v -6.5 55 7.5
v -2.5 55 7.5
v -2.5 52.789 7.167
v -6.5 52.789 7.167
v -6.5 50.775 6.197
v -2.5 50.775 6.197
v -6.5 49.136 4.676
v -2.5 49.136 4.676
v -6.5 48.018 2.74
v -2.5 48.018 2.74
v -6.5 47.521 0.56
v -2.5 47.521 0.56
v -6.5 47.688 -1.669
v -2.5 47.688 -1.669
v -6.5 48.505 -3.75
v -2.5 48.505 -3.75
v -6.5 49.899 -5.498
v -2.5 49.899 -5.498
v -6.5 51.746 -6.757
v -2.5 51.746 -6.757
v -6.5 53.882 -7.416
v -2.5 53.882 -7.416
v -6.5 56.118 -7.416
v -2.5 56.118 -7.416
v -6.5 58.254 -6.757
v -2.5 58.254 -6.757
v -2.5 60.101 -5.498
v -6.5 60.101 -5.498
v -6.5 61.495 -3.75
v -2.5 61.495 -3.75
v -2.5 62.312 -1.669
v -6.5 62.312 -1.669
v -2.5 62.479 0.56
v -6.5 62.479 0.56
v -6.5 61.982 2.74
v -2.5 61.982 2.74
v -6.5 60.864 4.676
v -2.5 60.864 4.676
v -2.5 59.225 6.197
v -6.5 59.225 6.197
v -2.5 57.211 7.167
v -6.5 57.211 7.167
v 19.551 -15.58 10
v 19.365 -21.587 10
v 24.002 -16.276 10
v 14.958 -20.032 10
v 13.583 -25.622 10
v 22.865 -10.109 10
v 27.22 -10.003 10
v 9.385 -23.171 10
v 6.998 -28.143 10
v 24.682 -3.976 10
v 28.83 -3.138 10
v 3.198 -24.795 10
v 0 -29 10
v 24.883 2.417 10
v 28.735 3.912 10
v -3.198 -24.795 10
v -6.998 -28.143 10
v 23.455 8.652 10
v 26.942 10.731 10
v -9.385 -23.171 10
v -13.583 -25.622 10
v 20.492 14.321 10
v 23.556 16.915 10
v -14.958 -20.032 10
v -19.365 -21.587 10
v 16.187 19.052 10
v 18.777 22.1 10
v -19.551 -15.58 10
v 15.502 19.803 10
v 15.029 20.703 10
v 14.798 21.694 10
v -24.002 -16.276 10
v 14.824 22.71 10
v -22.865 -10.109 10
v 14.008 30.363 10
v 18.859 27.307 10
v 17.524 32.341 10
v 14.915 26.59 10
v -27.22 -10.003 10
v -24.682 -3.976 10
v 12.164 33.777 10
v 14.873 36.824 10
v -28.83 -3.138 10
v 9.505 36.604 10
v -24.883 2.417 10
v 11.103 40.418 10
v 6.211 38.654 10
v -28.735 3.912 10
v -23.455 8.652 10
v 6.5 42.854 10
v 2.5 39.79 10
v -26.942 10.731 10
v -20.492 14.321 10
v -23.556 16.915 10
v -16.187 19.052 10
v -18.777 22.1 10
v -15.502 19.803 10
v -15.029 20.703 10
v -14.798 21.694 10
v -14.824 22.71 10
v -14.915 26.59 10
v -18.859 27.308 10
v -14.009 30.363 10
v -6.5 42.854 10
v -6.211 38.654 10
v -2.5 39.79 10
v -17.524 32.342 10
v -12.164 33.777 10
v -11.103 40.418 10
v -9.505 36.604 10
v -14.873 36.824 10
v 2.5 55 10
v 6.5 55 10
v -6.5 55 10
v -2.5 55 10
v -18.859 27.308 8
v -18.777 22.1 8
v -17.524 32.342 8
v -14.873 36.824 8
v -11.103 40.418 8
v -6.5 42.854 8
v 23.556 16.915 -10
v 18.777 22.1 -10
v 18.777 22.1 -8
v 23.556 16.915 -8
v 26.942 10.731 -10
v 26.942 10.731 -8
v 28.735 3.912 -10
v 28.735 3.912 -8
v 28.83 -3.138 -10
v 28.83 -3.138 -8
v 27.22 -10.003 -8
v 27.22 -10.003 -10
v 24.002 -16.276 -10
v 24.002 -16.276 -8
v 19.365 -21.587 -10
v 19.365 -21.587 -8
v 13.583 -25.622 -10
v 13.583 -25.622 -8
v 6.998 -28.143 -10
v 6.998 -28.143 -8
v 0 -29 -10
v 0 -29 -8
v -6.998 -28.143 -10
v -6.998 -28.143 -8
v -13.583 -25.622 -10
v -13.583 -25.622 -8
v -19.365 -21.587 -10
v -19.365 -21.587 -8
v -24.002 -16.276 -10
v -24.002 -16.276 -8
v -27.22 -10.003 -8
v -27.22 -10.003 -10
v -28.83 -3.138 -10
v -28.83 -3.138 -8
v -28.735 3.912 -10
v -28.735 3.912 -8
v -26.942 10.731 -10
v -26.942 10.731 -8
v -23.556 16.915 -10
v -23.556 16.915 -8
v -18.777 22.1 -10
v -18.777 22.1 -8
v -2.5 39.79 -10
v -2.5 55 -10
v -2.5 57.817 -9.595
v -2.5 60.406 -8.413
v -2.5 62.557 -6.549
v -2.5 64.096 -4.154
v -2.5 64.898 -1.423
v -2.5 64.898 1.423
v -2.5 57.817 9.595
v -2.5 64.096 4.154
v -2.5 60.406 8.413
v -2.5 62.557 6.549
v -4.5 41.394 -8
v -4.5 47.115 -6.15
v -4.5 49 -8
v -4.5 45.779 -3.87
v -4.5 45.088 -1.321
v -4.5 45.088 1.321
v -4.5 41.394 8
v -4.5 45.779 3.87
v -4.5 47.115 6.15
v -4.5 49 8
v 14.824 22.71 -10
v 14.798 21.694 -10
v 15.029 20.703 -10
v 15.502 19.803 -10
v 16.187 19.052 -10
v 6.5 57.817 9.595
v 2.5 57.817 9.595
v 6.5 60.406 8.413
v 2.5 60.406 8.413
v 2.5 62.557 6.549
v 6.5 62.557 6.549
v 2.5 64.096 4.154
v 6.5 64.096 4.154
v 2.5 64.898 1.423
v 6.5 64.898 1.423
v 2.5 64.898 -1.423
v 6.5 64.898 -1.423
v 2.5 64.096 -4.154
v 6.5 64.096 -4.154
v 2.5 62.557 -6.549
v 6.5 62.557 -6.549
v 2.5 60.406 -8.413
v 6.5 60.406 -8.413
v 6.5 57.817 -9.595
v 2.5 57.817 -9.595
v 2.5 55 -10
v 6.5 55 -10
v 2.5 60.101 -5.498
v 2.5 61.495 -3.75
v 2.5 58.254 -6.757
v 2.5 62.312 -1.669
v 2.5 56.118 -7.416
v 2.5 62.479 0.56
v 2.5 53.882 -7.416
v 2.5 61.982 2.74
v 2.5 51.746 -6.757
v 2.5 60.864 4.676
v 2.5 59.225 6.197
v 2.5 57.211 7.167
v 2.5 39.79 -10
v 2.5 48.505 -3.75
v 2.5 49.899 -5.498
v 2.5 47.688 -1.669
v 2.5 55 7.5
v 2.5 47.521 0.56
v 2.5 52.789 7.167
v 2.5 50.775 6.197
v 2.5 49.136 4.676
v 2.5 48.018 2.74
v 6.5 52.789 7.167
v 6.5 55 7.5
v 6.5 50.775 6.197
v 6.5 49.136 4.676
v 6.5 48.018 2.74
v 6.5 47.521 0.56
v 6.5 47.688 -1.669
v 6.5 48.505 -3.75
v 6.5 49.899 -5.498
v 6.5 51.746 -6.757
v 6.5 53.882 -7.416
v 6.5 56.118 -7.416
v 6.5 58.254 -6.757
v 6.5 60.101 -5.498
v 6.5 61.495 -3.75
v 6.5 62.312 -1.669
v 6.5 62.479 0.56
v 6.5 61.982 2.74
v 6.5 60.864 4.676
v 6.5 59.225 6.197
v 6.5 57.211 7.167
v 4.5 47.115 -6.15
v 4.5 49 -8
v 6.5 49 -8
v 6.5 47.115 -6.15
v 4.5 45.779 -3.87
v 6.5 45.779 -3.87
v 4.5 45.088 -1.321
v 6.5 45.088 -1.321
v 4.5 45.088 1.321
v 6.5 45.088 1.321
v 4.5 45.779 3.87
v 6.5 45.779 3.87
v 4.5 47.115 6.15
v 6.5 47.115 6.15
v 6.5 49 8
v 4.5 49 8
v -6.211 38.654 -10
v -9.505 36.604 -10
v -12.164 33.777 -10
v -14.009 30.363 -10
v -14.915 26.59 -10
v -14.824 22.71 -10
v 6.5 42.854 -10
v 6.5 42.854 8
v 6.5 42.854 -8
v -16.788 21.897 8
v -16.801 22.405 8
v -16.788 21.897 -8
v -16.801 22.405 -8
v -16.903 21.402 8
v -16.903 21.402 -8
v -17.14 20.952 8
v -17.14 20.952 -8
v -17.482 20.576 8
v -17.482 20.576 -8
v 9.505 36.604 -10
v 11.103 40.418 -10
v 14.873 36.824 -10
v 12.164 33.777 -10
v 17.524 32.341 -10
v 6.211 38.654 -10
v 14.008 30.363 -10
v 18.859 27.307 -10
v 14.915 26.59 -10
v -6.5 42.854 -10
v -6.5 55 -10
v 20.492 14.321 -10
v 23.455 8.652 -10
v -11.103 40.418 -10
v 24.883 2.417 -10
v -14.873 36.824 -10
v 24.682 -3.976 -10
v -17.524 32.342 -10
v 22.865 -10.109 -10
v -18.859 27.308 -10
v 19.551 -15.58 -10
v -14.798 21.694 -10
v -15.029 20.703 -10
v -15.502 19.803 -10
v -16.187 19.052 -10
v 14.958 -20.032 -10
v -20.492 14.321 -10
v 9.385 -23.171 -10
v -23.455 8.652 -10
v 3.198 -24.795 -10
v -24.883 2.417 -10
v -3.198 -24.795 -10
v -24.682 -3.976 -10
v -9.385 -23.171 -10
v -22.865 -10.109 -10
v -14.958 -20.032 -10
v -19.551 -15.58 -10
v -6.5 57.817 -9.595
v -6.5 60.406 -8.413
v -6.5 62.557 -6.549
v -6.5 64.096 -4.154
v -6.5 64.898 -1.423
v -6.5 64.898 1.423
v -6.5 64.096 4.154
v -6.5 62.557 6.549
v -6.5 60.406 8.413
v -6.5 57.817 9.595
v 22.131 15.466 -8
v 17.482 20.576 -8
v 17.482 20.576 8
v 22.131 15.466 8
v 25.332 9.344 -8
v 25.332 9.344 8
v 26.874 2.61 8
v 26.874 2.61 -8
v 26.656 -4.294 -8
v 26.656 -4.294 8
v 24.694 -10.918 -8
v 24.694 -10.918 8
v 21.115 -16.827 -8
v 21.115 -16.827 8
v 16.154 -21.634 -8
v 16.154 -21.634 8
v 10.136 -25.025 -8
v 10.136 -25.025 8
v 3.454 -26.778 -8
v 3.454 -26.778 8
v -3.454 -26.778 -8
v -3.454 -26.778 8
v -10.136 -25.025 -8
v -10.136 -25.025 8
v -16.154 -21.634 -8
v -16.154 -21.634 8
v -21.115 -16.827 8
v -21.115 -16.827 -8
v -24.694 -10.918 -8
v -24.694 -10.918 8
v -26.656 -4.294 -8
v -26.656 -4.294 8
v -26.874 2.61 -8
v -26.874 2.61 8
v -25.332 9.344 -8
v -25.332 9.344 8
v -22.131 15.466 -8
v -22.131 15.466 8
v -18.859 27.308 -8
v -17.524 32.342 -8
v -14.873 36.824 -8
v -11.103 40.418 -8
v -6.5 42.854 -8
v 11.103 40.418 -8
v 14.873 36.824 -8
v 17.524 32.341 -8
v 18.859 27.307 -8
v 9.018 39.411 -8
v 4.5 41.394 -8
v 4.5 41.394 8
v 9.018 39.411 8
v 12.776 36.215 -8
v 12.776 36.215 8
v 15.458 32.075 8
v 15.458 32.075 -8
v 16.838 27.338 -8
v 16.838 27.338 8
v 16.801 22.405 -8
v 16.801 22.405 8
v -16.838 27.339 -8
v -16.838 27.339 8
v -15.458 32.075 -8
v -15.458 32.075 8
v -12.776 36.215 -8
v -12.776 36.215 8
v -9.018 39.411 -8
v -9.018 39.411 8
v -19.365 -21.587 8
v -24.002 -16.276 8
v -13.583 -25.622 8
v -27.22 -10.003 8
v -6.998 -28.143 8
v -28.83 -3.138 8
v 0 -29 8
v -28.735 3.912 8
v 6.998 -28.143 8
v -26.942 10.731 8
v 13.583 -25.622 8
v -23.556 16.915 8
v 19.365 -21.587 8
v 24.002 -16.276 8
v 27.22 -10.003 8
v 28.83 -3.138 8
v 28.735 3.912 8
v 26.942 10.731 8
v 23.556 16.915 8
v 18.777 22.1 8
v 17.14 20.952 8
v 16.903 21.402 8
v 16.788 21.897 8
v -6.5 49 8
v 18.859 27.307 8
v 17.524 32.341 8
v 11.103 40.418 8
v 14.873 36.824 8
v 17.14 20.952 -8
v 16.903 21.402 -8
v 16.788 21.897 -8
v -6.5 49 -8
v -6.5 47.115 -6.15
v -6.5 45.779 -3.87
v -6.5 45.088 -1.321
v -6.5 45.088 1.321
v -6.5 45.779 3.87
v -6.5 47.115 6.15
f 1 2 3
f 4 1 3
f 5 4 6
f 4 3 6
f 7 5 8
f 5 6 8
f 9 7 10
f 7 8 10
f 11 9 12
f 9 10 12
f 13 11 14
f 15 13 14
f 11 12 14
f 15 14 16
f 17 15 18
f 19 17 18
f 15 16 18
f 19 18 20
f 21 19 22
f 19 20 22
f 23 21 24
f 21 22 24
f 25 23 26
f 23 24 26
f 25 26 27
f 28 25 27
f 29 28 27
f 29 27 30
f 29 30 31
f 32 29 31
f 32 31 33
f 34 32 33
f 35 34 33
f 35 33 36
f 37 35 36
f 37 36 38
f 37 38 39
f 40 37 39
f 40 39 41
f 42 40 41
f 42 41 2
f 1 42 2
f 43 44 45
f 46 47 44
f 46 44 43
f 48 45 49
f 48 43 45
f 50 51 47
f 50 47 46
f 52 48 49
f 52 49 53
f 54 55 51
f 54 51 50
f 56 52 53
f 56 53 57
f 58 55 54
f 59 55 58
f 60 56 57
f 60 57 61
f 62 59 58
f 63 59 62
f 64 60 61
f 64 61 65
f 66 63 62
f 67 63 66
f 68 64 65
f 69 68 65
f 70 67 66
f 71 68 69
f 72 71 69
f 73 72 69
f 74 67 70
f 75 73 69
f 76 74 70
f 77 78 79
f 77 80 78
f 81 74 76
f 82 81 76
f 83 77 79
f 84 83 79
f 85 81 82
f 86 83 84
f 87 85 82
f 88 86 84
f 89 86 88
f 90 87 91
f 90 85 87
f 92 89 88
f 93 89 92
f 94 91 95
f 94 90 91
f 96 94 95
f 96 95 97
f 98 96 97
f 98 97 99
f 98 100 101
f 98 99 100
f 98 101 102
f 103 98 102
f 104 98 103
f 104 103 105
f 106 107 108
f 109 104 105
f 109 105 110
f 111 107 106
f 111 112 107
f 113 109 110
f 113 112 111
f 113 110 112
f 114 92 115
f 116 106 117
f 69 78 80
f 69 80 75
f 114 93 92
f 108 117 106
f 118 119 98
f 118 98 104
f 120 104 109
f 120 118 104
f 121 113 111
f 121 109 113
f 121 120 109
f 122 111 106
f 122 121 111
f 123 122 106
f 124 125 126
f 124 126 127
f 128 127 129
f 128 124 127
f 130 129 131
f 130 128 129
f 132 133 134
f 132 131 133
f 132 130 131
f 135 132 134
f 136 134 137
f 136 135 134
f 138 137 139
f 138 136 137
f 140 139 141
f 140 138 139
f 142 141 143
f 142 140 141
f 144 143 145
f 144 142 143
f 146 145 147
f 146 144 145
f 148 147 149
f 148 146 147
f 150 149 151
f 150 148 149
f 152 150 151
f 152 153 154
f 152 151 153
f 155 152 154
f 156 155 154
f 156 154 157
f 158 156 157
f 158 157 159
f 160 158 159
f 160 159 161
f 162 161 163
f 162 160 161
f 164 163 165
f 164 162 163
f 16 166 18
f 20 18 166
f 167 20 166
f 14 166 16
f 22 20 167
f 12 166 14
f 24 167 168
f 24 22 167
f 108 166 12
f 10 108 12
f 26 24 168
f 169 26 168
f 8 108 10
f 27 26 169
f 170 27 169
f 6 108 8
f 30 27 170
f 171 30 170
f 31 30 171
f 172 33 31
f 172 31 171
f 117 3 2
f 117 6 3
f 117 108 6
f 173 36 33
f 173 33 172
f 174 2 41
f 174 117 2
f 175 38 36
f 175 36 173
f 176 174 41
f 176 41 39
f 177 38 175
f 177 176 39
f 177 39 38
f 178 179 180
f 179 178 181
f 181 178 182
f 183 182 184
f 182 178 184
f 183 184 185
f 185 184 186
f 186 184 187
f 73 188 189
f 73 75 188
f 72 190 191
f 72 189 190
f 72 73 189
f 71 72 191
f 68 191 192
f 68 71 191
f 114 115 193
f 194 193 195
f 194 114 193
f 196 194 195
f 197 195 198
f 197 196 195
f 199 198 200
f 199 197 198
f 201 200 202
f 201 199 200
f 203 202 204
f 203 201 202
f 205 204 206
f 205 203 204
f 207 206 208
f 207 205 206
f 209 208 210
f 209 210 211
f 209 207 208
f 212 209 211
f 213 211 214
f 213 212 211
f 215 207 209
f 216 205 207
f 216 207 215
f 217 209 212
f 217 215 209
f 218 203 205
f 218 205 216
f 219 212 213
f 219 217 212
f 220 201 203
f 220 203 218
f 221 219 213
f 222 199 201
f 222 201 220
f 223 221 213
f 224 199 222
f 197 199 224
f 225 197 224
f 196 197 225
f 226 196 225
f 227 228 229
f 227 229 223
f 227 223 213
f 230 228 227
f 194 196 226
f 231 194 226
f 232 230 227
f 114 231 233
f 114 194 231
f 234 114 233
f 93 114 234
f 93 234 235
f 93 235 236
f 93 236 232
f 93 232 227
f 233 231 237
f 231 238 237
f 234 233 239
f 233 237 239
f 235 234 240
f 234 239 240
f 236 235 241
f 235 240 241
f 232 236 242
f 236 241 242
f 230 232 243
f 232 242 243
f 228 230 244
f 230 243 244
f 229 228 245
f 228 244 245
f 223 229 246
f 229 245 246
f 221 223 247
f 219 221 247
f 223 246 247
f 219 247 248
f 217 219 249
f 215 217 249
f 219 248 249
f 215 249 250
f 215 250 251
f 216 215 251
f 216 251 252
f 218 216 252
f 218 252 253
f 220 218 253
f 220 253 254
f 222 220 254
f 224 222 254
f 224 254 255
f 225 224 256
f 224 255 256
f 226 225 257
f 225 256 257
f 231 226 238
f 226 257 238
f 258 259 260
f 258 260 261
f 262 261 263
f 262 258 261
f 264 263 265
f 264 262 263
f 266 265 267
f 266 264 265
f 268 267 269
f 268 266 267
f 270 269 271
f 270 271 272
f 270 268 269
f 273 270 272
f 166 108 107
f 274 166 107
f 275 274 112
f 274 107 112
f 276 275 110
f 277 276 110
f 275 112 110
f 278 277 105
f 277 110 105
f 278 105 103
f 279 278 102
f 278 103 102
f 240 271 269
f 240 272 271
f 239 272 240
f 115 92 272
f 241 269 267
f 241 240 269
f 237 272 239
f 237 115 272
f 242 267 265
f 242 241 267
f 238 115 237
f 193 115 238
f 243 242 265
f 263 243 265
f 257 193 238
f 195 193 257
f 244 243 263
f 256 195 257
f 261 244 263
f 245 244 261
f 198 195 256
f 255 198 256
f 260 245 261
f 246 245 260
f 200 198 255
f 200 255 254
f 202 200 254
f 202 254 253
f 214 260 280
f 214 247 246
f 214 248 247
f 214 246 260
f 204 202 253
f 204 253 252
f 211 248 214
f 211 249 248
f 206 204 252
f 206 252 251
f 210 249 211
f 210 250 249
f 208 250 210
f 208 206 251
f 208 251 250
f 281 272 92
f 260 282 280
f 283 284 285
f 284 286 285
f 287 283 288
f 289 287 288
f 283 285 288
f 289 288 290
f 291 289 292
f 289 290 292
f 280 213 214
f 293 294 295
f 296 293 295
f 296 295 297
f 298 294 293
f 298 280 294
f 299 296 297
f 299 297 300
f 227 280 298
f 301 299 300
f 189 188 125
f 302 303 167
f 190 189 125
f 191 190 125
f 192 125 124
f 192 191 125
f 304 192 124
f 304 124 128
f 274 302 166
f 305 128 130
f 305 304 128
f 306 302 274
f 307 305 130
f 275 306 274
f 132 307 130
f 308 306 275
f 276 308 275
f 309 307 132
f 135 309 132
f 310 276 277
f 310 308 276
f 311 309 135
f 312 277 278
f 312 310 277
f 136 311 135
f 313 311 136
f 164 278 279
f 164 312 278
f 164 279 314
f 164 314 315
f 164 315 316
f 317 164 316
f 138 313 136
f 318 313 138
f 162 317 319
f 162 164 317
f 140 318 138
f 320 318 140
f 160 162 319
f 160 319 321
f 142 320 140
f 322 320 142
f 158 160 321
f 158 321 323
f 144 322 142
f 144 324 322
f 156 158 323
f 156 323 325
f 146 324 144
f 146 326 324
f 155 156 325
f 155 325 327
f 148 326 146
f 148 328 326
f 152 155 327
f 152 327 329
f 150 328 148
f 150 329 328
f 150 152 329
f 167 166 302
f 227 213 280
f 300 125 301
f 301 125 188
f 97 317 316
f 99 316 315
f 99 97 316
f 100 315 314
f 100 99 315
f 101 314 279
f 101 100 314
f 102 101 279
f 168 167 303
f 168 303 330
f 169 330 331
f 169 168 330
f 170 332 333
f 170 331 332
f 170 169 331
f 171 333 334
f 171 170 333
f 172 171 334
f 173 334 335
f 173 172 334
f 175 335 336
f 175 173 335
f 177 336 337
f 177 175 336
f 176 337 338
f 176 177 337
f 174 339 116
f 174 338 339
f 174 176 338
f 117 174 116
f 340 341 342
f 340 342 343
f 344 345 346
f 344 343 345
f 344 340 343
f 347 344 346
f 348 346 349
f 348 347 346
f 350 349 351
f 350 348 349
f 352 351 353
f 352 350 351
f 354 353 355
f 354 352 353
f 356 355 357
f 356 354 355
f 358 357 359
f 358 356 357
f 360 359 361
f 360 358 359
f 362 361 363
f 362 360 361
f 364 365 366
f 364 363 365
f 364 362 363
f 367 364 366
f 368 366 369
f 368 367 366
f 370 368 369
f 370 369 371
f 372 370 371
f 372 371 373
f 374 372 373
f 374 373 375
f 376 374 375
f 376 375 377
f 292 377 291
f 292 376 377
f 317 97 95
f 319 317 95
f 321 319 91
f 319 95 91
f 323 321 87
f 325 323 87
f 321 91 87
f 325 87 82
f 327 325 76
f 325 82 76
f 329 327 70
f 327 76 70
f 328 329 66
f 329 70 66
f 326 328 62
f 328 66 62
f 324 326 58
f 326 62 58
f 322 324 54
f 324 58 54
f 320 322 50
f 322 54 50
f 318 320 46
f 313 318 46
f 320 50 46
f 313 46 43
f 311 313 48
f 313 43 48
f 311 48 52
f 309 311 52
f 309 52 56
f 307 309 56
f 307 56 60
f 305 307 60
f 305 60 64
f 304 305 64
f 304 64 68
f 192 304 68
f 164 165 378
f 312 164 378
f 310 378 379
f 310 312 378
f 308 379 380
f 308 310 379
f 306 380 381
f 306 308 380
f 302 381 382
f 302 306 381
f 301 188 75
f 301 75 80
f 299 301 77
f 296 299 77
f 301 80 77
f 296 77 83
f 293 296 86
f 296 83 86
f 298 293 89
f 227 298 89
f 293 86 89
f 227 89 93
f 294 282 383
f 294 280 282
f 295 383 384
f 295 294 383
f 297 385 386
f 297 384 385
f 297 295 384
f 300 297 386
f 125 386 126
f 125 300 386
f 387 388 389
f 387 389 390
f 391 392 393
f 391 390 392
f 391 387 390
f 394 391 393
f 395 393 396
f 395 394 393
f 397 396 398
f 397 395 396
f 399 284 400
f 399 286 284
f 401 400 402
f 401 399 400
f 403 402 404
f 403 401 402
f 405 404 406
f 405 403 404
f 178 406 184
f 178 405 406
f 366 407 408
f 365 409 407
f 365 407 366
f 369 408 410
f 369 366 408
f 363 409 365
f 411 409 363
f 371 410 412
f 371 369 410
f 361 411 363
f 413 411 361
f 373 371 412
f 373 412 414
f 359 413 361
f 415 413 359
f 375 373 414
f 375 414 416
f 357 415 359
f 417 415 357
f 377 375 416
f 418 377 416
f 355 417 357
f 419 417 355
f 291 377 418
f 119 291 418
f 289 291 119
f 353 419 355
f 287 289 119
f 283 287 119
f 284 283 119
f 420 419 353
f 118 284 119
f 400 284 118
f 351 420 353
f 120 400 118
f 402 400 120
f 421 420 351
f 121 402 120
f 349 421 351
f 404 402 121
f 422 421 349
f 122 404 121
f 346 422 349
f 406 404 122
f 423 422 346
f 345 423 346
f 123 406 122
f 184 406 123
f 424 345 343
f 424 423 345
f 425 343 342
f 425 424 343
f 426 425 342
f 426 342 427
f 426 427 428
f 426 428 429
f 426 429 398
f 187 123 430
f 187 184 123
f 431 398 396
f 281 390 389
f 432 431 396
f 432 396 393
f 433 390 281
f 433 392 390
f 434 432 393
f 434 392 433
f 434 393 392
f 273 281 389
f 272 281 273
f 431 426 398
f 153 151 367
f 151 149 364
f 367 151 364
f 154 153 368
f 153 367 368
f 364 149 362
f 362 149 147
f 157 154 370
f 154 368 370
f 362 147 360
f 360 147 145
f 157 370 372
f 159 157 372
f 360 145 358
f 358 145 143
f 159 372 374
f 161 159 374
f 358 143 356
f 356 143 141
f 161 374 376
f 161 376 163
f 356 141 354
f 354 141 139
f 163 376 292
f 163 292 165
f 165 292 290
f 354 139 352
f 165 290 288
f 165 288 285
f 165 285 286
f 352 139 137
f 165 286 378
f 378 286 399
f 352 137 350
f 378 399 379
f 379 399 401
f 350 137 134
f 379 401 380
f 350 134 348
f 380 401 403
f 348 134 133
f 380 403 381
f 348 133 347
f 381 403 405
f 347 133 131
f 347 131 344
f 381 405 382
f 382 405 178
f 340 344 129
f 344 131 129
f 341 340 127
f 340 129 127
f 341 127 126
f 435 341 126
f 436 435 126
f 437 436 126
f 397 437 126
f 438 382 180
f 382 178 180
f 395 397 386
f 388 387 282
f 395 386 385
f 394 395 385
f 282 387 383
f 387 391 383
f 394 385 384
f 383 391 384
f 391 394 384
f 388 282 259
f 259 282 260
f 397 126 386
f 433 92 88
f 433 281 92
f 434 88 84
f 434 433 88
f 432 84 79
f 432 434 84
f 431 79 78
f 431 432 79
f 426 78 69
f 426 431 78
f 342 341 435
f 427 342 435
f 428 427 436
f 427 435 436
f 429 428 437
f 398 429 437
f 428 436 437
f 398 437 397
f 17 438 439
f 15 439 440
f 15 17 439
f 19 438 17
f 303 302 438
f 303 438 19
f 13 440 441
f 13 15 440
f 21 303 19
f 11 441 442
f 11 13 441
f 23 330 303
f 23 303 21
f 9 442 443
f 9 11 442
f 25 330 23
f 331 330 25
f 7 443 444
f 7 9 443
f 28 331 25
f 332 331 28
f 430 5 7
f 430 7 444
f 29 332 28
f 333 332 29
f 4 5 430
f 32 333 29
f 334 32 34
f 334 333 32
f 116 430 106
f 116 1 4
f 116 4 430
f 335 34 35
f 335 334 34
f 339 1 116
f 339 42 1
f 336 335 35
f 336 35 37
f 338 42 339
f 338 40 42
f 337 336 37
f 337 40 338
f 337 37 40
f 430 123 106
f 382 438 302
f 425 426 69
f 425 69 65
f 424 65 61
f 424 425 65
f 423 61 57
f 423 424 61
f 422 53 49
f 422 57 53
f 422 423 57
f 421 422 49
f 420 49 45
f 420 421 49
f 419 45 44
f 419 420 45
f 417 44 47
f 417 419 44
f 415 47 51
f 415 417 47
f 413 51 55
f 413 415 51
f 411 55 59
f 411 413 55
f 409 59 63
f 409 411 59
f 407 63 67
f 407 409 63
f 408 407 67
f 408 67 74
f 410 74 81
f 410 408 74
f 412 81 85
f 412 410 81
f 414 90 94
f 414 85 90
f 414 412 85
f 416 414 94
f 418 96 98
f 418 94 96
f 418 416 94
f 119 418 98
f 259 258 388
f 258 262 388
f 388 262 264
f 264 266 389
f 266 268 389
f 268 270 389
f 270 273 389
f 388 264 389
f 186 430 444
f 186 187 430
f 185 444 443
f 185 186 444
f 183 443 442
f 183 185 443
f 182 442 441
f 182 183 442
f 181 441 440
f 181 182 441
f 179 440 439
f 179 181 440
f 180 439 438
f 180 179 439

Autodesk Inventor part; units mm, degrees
ref_plane "XZ Plane" through (0, 0, 0) normal (0, 1, 0) x (-1, 0, 0)
ref_plane "XY Plane" through (0, 0, 0) normal (0, 0, 1) x (1, 0, 0)
sketch "Sketch1" plane through (0, 0, 0) normal (0, 0, 1) x (1, 0, 0)
  arc A0 (-16.1874, 19.0517) -> (16.1874, 19.0517) centre (0, 0) ccw
  line L0 (-2.5, 50.7018) -> (-2.5, 39.7902) construction
  line L1 (2.5, 50.7018) -> (2.5, 39.7902) construction
  line L2 (2.5, 50.7018) -> (-2.5, 50.7018) construction
  arc A1 (14.8242, 22.7105) -> (2.5, 39.7902) centre (0, 25) ccw
  arc A2 (-2.5, 39.7902) -> (-14.8242, 22.7105) centre (0, 25) ccw
  arc A3 (-16.1874, 19.0517) -> (-14.8242, 22.7105) centre (-18.7774, 22.1) ccw
  arc A4 (14.8242, 22.7105) -> (16.1874, 19.0517) centre (18.7774, 22.1) ccw
  dimension "d0" = 25
  dimension "d2" = 25
  dimension "d3" = 5
  dimension "d4" = 4
sketch "Sketch2" plane through (0, 0, 0) normal (1, 0, 0) x (0, 1, 0)
  line L0 (-25, 10) -> (-25, -10)
  line L1 (-25, -10) -> (-29, -10)
  line L2 (-29, -10) -> (-29, -8)
  line L3 (-29, -8) -> (-27, -8)
  line L4 (-27, -8) -> (-27, 8)
  line L5 (-27, 8) -> (-29, 8)
  line L6 (-29, 8) -> (-29, 10)
  line L7 (-29, 10) -> (-25, 10)
  line L8 (19.0517, 0) -> (-25, 0) projected
  point P0 (0, 0)
  point P1 (19.0517, 0)
  dimension "d5" = 20
  dimension "d6" = 2
  dimension "d8" = 4
  dimension "d9" = 2
sweep "Sweep1" add profiles "Sketch2" path "Sketch1"
ref_plane "Work Plane1" through (-2.5, 39.7902, 10) normal (1, 0, 0) x (0, 1, 0)
sketch "Sketch3" plane through (-2.5, 39.7902, 10) normal (1, 0, 0) x (0, 1, 0)
  line L0 (0, 0) -> (0, -20)
  line L1 (0, -20) -> (15.2098, -20)
  arc A0 (15.2098, -20) -> (15.2098, 0) centre (15.2098, -10) ccw
  line L2 (15.2098, 0) -> (0, 0)
  line L3 (3.9441, 0) -> (3.9441, -2) projected
  point P0 (-39.7902, -10)
  dimension "d12" = 55
extrude "Extrusion1" add sketch "Sketch3" against normal blind 2
sketch "Sketch4" plane through (-4.5, 39.7902, 10) normal (-1, 0, 0) x (0, 0, 1)
  line L0 (-2, 3.6692) -> (-2, 1.6034) construction
  line L1 (0, 3.6692) -> (0, 15.2098) projected
  arc A0 (0, 15.2098) -> (-20, 15.2098) centre (-10, 15.2098) ccw projected
  line L2 (-20, 15.2098) -> (-20, 3.6692) projected
  arc A1 (-18, 9.2098) -> (-2, 9.2098) centre (-10, 15.2098) ccw
  line L3 (-20, 3.6692) -> (-20, 1.6034)
  line L4 (-20, 3.9441) -> (-20, 0) projected
  line L5 (-18, 1.6034) -> (-18, 9.2098)
  line L6 (-18, 1.972) -> (-18, 3.9441) projected
  line L7 (-18, 1.6034) -> (-20, 1.6034)
  line L8 (0, 3.6692) -> (0, 1.6034)
  line L9 (0, -17.6902) -> (0, 3.9441) projected
  line L10 (0, 1.6034) -> (-2, 1.6034)
  line L11 (-2, 1.6034) -> (-2, 9.2098)
  point P0 (-10, -39.7902)
extrude "Extrusion2" add sketch "Sketch4" along normal blind 2
mirror "Mirror1" about plane through (0, 0, 0) normal (1, 0, 0) of "Extrusion1", "Extrusion2"
sketch "Sketch5" plane through (-6.5, 39.7902, 10) normal (-1, 0, 0) x (0, 0, 1)
  arc A0 (0, 15.2098) -> (-20, 15.2098) centre (-10, 15.2098) ccw projected
  point P0 (-10, -39.7902)
hole "Hole1" at (-6.5, 55, 0) direction (1, 0, 0) diameter 15 end through all
properties part number "Part015. Double clip" material "Steel, Carbon"
